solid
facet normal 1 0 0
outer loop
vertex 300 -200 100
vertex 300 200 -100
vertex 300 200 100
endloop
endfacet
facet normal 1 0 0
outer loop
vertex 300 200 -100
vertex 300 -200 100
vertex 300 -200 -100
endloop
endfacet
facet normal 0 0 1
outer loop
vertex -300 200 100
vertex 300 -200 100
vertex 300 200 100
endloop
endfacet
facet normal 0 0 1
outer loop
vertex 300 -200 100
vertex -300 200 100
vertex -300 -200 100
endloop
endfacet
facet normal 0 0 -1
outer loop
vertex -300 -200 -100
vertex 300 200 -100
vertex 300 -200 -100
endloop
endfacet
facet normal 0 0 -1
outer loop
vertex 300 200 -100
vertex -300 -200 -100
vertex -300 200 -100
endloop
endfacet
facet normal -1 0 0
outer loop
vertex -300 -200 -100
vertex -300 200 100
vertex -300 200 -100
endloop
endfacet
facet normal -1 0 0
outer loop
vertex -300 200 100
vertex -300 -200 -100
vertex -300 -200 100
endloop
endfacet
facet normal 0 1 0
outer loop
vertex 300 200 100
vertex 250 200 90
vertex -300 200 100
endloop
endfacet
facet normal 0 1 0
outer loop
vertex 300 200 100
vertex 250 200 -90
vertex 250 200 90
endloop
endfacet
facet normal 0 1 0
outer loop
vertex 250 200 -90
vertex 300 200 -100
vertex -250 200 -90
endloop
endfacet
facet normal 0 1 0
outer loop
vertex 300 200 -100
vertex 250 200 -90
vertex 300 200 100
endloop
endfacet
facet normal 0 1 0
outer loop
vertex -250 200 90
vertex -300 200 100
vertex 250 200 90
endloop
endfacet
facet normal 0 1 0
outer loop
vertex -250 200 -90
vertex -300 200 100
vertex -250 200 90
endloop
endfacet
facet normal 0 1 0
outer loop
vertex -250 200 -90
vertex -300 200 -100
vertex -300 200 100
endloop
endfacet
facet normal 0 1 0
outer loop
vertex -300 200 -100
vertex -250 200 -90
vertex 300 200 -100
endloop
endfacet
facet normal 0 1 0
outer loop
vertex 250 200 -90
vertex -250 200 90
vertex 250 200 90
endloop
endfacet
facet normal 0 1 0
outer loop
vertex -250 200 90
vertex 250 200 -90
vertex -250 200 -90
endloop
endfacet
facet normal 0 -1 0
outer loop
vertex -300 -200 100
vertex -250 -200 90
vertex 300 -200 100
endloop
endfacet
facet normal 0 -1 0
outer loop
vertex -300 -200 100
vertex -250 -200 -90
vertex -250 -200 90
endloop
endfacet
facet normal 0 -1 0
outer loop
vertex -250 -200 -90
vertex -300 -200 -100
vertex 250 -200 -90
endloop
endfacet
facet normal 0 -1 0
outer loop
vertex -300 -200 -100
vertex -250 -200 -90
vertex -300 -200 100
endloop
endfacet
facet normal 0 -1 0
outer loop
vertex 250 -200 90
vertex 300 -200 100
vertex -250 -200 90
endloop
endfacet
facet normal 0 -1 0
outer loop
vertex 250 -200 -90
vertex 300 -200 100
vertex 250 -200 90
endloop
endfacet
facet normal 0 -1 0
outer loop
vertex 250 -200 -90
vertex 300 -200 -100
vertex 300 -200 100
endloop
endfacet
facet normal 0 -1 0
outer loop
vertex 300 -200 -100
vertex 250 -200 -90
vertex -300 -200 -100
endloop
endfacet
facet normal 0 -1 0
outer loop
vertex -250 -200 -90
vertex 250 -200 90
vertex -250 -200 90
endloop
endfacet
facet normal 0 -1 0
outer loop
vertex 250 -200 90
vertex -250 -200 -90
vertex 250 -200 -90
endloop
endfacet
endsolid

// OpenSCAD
// BuilderBot Base Link Mesh

module base_link() {
    // Main chassis body
    difference() {
        // Outer body
        union() {
            // Main rectangular body
            cube([600, 400, 200], center=true);
            
            // Slight rounding of edges
            minkowski() {
                cube([550, 350, 180], center=true);
                sphere(r=10, $fn=20);
            }
        }
        
        // Cutouts for tracks
        translate([0, 250, 0]) 
            cube([500, 100, 180], center=true);
        
        translate([0, -250, 0]) 
            cube([500, 100, 180], center=true);
    }
}

// Render and export
base_link();
